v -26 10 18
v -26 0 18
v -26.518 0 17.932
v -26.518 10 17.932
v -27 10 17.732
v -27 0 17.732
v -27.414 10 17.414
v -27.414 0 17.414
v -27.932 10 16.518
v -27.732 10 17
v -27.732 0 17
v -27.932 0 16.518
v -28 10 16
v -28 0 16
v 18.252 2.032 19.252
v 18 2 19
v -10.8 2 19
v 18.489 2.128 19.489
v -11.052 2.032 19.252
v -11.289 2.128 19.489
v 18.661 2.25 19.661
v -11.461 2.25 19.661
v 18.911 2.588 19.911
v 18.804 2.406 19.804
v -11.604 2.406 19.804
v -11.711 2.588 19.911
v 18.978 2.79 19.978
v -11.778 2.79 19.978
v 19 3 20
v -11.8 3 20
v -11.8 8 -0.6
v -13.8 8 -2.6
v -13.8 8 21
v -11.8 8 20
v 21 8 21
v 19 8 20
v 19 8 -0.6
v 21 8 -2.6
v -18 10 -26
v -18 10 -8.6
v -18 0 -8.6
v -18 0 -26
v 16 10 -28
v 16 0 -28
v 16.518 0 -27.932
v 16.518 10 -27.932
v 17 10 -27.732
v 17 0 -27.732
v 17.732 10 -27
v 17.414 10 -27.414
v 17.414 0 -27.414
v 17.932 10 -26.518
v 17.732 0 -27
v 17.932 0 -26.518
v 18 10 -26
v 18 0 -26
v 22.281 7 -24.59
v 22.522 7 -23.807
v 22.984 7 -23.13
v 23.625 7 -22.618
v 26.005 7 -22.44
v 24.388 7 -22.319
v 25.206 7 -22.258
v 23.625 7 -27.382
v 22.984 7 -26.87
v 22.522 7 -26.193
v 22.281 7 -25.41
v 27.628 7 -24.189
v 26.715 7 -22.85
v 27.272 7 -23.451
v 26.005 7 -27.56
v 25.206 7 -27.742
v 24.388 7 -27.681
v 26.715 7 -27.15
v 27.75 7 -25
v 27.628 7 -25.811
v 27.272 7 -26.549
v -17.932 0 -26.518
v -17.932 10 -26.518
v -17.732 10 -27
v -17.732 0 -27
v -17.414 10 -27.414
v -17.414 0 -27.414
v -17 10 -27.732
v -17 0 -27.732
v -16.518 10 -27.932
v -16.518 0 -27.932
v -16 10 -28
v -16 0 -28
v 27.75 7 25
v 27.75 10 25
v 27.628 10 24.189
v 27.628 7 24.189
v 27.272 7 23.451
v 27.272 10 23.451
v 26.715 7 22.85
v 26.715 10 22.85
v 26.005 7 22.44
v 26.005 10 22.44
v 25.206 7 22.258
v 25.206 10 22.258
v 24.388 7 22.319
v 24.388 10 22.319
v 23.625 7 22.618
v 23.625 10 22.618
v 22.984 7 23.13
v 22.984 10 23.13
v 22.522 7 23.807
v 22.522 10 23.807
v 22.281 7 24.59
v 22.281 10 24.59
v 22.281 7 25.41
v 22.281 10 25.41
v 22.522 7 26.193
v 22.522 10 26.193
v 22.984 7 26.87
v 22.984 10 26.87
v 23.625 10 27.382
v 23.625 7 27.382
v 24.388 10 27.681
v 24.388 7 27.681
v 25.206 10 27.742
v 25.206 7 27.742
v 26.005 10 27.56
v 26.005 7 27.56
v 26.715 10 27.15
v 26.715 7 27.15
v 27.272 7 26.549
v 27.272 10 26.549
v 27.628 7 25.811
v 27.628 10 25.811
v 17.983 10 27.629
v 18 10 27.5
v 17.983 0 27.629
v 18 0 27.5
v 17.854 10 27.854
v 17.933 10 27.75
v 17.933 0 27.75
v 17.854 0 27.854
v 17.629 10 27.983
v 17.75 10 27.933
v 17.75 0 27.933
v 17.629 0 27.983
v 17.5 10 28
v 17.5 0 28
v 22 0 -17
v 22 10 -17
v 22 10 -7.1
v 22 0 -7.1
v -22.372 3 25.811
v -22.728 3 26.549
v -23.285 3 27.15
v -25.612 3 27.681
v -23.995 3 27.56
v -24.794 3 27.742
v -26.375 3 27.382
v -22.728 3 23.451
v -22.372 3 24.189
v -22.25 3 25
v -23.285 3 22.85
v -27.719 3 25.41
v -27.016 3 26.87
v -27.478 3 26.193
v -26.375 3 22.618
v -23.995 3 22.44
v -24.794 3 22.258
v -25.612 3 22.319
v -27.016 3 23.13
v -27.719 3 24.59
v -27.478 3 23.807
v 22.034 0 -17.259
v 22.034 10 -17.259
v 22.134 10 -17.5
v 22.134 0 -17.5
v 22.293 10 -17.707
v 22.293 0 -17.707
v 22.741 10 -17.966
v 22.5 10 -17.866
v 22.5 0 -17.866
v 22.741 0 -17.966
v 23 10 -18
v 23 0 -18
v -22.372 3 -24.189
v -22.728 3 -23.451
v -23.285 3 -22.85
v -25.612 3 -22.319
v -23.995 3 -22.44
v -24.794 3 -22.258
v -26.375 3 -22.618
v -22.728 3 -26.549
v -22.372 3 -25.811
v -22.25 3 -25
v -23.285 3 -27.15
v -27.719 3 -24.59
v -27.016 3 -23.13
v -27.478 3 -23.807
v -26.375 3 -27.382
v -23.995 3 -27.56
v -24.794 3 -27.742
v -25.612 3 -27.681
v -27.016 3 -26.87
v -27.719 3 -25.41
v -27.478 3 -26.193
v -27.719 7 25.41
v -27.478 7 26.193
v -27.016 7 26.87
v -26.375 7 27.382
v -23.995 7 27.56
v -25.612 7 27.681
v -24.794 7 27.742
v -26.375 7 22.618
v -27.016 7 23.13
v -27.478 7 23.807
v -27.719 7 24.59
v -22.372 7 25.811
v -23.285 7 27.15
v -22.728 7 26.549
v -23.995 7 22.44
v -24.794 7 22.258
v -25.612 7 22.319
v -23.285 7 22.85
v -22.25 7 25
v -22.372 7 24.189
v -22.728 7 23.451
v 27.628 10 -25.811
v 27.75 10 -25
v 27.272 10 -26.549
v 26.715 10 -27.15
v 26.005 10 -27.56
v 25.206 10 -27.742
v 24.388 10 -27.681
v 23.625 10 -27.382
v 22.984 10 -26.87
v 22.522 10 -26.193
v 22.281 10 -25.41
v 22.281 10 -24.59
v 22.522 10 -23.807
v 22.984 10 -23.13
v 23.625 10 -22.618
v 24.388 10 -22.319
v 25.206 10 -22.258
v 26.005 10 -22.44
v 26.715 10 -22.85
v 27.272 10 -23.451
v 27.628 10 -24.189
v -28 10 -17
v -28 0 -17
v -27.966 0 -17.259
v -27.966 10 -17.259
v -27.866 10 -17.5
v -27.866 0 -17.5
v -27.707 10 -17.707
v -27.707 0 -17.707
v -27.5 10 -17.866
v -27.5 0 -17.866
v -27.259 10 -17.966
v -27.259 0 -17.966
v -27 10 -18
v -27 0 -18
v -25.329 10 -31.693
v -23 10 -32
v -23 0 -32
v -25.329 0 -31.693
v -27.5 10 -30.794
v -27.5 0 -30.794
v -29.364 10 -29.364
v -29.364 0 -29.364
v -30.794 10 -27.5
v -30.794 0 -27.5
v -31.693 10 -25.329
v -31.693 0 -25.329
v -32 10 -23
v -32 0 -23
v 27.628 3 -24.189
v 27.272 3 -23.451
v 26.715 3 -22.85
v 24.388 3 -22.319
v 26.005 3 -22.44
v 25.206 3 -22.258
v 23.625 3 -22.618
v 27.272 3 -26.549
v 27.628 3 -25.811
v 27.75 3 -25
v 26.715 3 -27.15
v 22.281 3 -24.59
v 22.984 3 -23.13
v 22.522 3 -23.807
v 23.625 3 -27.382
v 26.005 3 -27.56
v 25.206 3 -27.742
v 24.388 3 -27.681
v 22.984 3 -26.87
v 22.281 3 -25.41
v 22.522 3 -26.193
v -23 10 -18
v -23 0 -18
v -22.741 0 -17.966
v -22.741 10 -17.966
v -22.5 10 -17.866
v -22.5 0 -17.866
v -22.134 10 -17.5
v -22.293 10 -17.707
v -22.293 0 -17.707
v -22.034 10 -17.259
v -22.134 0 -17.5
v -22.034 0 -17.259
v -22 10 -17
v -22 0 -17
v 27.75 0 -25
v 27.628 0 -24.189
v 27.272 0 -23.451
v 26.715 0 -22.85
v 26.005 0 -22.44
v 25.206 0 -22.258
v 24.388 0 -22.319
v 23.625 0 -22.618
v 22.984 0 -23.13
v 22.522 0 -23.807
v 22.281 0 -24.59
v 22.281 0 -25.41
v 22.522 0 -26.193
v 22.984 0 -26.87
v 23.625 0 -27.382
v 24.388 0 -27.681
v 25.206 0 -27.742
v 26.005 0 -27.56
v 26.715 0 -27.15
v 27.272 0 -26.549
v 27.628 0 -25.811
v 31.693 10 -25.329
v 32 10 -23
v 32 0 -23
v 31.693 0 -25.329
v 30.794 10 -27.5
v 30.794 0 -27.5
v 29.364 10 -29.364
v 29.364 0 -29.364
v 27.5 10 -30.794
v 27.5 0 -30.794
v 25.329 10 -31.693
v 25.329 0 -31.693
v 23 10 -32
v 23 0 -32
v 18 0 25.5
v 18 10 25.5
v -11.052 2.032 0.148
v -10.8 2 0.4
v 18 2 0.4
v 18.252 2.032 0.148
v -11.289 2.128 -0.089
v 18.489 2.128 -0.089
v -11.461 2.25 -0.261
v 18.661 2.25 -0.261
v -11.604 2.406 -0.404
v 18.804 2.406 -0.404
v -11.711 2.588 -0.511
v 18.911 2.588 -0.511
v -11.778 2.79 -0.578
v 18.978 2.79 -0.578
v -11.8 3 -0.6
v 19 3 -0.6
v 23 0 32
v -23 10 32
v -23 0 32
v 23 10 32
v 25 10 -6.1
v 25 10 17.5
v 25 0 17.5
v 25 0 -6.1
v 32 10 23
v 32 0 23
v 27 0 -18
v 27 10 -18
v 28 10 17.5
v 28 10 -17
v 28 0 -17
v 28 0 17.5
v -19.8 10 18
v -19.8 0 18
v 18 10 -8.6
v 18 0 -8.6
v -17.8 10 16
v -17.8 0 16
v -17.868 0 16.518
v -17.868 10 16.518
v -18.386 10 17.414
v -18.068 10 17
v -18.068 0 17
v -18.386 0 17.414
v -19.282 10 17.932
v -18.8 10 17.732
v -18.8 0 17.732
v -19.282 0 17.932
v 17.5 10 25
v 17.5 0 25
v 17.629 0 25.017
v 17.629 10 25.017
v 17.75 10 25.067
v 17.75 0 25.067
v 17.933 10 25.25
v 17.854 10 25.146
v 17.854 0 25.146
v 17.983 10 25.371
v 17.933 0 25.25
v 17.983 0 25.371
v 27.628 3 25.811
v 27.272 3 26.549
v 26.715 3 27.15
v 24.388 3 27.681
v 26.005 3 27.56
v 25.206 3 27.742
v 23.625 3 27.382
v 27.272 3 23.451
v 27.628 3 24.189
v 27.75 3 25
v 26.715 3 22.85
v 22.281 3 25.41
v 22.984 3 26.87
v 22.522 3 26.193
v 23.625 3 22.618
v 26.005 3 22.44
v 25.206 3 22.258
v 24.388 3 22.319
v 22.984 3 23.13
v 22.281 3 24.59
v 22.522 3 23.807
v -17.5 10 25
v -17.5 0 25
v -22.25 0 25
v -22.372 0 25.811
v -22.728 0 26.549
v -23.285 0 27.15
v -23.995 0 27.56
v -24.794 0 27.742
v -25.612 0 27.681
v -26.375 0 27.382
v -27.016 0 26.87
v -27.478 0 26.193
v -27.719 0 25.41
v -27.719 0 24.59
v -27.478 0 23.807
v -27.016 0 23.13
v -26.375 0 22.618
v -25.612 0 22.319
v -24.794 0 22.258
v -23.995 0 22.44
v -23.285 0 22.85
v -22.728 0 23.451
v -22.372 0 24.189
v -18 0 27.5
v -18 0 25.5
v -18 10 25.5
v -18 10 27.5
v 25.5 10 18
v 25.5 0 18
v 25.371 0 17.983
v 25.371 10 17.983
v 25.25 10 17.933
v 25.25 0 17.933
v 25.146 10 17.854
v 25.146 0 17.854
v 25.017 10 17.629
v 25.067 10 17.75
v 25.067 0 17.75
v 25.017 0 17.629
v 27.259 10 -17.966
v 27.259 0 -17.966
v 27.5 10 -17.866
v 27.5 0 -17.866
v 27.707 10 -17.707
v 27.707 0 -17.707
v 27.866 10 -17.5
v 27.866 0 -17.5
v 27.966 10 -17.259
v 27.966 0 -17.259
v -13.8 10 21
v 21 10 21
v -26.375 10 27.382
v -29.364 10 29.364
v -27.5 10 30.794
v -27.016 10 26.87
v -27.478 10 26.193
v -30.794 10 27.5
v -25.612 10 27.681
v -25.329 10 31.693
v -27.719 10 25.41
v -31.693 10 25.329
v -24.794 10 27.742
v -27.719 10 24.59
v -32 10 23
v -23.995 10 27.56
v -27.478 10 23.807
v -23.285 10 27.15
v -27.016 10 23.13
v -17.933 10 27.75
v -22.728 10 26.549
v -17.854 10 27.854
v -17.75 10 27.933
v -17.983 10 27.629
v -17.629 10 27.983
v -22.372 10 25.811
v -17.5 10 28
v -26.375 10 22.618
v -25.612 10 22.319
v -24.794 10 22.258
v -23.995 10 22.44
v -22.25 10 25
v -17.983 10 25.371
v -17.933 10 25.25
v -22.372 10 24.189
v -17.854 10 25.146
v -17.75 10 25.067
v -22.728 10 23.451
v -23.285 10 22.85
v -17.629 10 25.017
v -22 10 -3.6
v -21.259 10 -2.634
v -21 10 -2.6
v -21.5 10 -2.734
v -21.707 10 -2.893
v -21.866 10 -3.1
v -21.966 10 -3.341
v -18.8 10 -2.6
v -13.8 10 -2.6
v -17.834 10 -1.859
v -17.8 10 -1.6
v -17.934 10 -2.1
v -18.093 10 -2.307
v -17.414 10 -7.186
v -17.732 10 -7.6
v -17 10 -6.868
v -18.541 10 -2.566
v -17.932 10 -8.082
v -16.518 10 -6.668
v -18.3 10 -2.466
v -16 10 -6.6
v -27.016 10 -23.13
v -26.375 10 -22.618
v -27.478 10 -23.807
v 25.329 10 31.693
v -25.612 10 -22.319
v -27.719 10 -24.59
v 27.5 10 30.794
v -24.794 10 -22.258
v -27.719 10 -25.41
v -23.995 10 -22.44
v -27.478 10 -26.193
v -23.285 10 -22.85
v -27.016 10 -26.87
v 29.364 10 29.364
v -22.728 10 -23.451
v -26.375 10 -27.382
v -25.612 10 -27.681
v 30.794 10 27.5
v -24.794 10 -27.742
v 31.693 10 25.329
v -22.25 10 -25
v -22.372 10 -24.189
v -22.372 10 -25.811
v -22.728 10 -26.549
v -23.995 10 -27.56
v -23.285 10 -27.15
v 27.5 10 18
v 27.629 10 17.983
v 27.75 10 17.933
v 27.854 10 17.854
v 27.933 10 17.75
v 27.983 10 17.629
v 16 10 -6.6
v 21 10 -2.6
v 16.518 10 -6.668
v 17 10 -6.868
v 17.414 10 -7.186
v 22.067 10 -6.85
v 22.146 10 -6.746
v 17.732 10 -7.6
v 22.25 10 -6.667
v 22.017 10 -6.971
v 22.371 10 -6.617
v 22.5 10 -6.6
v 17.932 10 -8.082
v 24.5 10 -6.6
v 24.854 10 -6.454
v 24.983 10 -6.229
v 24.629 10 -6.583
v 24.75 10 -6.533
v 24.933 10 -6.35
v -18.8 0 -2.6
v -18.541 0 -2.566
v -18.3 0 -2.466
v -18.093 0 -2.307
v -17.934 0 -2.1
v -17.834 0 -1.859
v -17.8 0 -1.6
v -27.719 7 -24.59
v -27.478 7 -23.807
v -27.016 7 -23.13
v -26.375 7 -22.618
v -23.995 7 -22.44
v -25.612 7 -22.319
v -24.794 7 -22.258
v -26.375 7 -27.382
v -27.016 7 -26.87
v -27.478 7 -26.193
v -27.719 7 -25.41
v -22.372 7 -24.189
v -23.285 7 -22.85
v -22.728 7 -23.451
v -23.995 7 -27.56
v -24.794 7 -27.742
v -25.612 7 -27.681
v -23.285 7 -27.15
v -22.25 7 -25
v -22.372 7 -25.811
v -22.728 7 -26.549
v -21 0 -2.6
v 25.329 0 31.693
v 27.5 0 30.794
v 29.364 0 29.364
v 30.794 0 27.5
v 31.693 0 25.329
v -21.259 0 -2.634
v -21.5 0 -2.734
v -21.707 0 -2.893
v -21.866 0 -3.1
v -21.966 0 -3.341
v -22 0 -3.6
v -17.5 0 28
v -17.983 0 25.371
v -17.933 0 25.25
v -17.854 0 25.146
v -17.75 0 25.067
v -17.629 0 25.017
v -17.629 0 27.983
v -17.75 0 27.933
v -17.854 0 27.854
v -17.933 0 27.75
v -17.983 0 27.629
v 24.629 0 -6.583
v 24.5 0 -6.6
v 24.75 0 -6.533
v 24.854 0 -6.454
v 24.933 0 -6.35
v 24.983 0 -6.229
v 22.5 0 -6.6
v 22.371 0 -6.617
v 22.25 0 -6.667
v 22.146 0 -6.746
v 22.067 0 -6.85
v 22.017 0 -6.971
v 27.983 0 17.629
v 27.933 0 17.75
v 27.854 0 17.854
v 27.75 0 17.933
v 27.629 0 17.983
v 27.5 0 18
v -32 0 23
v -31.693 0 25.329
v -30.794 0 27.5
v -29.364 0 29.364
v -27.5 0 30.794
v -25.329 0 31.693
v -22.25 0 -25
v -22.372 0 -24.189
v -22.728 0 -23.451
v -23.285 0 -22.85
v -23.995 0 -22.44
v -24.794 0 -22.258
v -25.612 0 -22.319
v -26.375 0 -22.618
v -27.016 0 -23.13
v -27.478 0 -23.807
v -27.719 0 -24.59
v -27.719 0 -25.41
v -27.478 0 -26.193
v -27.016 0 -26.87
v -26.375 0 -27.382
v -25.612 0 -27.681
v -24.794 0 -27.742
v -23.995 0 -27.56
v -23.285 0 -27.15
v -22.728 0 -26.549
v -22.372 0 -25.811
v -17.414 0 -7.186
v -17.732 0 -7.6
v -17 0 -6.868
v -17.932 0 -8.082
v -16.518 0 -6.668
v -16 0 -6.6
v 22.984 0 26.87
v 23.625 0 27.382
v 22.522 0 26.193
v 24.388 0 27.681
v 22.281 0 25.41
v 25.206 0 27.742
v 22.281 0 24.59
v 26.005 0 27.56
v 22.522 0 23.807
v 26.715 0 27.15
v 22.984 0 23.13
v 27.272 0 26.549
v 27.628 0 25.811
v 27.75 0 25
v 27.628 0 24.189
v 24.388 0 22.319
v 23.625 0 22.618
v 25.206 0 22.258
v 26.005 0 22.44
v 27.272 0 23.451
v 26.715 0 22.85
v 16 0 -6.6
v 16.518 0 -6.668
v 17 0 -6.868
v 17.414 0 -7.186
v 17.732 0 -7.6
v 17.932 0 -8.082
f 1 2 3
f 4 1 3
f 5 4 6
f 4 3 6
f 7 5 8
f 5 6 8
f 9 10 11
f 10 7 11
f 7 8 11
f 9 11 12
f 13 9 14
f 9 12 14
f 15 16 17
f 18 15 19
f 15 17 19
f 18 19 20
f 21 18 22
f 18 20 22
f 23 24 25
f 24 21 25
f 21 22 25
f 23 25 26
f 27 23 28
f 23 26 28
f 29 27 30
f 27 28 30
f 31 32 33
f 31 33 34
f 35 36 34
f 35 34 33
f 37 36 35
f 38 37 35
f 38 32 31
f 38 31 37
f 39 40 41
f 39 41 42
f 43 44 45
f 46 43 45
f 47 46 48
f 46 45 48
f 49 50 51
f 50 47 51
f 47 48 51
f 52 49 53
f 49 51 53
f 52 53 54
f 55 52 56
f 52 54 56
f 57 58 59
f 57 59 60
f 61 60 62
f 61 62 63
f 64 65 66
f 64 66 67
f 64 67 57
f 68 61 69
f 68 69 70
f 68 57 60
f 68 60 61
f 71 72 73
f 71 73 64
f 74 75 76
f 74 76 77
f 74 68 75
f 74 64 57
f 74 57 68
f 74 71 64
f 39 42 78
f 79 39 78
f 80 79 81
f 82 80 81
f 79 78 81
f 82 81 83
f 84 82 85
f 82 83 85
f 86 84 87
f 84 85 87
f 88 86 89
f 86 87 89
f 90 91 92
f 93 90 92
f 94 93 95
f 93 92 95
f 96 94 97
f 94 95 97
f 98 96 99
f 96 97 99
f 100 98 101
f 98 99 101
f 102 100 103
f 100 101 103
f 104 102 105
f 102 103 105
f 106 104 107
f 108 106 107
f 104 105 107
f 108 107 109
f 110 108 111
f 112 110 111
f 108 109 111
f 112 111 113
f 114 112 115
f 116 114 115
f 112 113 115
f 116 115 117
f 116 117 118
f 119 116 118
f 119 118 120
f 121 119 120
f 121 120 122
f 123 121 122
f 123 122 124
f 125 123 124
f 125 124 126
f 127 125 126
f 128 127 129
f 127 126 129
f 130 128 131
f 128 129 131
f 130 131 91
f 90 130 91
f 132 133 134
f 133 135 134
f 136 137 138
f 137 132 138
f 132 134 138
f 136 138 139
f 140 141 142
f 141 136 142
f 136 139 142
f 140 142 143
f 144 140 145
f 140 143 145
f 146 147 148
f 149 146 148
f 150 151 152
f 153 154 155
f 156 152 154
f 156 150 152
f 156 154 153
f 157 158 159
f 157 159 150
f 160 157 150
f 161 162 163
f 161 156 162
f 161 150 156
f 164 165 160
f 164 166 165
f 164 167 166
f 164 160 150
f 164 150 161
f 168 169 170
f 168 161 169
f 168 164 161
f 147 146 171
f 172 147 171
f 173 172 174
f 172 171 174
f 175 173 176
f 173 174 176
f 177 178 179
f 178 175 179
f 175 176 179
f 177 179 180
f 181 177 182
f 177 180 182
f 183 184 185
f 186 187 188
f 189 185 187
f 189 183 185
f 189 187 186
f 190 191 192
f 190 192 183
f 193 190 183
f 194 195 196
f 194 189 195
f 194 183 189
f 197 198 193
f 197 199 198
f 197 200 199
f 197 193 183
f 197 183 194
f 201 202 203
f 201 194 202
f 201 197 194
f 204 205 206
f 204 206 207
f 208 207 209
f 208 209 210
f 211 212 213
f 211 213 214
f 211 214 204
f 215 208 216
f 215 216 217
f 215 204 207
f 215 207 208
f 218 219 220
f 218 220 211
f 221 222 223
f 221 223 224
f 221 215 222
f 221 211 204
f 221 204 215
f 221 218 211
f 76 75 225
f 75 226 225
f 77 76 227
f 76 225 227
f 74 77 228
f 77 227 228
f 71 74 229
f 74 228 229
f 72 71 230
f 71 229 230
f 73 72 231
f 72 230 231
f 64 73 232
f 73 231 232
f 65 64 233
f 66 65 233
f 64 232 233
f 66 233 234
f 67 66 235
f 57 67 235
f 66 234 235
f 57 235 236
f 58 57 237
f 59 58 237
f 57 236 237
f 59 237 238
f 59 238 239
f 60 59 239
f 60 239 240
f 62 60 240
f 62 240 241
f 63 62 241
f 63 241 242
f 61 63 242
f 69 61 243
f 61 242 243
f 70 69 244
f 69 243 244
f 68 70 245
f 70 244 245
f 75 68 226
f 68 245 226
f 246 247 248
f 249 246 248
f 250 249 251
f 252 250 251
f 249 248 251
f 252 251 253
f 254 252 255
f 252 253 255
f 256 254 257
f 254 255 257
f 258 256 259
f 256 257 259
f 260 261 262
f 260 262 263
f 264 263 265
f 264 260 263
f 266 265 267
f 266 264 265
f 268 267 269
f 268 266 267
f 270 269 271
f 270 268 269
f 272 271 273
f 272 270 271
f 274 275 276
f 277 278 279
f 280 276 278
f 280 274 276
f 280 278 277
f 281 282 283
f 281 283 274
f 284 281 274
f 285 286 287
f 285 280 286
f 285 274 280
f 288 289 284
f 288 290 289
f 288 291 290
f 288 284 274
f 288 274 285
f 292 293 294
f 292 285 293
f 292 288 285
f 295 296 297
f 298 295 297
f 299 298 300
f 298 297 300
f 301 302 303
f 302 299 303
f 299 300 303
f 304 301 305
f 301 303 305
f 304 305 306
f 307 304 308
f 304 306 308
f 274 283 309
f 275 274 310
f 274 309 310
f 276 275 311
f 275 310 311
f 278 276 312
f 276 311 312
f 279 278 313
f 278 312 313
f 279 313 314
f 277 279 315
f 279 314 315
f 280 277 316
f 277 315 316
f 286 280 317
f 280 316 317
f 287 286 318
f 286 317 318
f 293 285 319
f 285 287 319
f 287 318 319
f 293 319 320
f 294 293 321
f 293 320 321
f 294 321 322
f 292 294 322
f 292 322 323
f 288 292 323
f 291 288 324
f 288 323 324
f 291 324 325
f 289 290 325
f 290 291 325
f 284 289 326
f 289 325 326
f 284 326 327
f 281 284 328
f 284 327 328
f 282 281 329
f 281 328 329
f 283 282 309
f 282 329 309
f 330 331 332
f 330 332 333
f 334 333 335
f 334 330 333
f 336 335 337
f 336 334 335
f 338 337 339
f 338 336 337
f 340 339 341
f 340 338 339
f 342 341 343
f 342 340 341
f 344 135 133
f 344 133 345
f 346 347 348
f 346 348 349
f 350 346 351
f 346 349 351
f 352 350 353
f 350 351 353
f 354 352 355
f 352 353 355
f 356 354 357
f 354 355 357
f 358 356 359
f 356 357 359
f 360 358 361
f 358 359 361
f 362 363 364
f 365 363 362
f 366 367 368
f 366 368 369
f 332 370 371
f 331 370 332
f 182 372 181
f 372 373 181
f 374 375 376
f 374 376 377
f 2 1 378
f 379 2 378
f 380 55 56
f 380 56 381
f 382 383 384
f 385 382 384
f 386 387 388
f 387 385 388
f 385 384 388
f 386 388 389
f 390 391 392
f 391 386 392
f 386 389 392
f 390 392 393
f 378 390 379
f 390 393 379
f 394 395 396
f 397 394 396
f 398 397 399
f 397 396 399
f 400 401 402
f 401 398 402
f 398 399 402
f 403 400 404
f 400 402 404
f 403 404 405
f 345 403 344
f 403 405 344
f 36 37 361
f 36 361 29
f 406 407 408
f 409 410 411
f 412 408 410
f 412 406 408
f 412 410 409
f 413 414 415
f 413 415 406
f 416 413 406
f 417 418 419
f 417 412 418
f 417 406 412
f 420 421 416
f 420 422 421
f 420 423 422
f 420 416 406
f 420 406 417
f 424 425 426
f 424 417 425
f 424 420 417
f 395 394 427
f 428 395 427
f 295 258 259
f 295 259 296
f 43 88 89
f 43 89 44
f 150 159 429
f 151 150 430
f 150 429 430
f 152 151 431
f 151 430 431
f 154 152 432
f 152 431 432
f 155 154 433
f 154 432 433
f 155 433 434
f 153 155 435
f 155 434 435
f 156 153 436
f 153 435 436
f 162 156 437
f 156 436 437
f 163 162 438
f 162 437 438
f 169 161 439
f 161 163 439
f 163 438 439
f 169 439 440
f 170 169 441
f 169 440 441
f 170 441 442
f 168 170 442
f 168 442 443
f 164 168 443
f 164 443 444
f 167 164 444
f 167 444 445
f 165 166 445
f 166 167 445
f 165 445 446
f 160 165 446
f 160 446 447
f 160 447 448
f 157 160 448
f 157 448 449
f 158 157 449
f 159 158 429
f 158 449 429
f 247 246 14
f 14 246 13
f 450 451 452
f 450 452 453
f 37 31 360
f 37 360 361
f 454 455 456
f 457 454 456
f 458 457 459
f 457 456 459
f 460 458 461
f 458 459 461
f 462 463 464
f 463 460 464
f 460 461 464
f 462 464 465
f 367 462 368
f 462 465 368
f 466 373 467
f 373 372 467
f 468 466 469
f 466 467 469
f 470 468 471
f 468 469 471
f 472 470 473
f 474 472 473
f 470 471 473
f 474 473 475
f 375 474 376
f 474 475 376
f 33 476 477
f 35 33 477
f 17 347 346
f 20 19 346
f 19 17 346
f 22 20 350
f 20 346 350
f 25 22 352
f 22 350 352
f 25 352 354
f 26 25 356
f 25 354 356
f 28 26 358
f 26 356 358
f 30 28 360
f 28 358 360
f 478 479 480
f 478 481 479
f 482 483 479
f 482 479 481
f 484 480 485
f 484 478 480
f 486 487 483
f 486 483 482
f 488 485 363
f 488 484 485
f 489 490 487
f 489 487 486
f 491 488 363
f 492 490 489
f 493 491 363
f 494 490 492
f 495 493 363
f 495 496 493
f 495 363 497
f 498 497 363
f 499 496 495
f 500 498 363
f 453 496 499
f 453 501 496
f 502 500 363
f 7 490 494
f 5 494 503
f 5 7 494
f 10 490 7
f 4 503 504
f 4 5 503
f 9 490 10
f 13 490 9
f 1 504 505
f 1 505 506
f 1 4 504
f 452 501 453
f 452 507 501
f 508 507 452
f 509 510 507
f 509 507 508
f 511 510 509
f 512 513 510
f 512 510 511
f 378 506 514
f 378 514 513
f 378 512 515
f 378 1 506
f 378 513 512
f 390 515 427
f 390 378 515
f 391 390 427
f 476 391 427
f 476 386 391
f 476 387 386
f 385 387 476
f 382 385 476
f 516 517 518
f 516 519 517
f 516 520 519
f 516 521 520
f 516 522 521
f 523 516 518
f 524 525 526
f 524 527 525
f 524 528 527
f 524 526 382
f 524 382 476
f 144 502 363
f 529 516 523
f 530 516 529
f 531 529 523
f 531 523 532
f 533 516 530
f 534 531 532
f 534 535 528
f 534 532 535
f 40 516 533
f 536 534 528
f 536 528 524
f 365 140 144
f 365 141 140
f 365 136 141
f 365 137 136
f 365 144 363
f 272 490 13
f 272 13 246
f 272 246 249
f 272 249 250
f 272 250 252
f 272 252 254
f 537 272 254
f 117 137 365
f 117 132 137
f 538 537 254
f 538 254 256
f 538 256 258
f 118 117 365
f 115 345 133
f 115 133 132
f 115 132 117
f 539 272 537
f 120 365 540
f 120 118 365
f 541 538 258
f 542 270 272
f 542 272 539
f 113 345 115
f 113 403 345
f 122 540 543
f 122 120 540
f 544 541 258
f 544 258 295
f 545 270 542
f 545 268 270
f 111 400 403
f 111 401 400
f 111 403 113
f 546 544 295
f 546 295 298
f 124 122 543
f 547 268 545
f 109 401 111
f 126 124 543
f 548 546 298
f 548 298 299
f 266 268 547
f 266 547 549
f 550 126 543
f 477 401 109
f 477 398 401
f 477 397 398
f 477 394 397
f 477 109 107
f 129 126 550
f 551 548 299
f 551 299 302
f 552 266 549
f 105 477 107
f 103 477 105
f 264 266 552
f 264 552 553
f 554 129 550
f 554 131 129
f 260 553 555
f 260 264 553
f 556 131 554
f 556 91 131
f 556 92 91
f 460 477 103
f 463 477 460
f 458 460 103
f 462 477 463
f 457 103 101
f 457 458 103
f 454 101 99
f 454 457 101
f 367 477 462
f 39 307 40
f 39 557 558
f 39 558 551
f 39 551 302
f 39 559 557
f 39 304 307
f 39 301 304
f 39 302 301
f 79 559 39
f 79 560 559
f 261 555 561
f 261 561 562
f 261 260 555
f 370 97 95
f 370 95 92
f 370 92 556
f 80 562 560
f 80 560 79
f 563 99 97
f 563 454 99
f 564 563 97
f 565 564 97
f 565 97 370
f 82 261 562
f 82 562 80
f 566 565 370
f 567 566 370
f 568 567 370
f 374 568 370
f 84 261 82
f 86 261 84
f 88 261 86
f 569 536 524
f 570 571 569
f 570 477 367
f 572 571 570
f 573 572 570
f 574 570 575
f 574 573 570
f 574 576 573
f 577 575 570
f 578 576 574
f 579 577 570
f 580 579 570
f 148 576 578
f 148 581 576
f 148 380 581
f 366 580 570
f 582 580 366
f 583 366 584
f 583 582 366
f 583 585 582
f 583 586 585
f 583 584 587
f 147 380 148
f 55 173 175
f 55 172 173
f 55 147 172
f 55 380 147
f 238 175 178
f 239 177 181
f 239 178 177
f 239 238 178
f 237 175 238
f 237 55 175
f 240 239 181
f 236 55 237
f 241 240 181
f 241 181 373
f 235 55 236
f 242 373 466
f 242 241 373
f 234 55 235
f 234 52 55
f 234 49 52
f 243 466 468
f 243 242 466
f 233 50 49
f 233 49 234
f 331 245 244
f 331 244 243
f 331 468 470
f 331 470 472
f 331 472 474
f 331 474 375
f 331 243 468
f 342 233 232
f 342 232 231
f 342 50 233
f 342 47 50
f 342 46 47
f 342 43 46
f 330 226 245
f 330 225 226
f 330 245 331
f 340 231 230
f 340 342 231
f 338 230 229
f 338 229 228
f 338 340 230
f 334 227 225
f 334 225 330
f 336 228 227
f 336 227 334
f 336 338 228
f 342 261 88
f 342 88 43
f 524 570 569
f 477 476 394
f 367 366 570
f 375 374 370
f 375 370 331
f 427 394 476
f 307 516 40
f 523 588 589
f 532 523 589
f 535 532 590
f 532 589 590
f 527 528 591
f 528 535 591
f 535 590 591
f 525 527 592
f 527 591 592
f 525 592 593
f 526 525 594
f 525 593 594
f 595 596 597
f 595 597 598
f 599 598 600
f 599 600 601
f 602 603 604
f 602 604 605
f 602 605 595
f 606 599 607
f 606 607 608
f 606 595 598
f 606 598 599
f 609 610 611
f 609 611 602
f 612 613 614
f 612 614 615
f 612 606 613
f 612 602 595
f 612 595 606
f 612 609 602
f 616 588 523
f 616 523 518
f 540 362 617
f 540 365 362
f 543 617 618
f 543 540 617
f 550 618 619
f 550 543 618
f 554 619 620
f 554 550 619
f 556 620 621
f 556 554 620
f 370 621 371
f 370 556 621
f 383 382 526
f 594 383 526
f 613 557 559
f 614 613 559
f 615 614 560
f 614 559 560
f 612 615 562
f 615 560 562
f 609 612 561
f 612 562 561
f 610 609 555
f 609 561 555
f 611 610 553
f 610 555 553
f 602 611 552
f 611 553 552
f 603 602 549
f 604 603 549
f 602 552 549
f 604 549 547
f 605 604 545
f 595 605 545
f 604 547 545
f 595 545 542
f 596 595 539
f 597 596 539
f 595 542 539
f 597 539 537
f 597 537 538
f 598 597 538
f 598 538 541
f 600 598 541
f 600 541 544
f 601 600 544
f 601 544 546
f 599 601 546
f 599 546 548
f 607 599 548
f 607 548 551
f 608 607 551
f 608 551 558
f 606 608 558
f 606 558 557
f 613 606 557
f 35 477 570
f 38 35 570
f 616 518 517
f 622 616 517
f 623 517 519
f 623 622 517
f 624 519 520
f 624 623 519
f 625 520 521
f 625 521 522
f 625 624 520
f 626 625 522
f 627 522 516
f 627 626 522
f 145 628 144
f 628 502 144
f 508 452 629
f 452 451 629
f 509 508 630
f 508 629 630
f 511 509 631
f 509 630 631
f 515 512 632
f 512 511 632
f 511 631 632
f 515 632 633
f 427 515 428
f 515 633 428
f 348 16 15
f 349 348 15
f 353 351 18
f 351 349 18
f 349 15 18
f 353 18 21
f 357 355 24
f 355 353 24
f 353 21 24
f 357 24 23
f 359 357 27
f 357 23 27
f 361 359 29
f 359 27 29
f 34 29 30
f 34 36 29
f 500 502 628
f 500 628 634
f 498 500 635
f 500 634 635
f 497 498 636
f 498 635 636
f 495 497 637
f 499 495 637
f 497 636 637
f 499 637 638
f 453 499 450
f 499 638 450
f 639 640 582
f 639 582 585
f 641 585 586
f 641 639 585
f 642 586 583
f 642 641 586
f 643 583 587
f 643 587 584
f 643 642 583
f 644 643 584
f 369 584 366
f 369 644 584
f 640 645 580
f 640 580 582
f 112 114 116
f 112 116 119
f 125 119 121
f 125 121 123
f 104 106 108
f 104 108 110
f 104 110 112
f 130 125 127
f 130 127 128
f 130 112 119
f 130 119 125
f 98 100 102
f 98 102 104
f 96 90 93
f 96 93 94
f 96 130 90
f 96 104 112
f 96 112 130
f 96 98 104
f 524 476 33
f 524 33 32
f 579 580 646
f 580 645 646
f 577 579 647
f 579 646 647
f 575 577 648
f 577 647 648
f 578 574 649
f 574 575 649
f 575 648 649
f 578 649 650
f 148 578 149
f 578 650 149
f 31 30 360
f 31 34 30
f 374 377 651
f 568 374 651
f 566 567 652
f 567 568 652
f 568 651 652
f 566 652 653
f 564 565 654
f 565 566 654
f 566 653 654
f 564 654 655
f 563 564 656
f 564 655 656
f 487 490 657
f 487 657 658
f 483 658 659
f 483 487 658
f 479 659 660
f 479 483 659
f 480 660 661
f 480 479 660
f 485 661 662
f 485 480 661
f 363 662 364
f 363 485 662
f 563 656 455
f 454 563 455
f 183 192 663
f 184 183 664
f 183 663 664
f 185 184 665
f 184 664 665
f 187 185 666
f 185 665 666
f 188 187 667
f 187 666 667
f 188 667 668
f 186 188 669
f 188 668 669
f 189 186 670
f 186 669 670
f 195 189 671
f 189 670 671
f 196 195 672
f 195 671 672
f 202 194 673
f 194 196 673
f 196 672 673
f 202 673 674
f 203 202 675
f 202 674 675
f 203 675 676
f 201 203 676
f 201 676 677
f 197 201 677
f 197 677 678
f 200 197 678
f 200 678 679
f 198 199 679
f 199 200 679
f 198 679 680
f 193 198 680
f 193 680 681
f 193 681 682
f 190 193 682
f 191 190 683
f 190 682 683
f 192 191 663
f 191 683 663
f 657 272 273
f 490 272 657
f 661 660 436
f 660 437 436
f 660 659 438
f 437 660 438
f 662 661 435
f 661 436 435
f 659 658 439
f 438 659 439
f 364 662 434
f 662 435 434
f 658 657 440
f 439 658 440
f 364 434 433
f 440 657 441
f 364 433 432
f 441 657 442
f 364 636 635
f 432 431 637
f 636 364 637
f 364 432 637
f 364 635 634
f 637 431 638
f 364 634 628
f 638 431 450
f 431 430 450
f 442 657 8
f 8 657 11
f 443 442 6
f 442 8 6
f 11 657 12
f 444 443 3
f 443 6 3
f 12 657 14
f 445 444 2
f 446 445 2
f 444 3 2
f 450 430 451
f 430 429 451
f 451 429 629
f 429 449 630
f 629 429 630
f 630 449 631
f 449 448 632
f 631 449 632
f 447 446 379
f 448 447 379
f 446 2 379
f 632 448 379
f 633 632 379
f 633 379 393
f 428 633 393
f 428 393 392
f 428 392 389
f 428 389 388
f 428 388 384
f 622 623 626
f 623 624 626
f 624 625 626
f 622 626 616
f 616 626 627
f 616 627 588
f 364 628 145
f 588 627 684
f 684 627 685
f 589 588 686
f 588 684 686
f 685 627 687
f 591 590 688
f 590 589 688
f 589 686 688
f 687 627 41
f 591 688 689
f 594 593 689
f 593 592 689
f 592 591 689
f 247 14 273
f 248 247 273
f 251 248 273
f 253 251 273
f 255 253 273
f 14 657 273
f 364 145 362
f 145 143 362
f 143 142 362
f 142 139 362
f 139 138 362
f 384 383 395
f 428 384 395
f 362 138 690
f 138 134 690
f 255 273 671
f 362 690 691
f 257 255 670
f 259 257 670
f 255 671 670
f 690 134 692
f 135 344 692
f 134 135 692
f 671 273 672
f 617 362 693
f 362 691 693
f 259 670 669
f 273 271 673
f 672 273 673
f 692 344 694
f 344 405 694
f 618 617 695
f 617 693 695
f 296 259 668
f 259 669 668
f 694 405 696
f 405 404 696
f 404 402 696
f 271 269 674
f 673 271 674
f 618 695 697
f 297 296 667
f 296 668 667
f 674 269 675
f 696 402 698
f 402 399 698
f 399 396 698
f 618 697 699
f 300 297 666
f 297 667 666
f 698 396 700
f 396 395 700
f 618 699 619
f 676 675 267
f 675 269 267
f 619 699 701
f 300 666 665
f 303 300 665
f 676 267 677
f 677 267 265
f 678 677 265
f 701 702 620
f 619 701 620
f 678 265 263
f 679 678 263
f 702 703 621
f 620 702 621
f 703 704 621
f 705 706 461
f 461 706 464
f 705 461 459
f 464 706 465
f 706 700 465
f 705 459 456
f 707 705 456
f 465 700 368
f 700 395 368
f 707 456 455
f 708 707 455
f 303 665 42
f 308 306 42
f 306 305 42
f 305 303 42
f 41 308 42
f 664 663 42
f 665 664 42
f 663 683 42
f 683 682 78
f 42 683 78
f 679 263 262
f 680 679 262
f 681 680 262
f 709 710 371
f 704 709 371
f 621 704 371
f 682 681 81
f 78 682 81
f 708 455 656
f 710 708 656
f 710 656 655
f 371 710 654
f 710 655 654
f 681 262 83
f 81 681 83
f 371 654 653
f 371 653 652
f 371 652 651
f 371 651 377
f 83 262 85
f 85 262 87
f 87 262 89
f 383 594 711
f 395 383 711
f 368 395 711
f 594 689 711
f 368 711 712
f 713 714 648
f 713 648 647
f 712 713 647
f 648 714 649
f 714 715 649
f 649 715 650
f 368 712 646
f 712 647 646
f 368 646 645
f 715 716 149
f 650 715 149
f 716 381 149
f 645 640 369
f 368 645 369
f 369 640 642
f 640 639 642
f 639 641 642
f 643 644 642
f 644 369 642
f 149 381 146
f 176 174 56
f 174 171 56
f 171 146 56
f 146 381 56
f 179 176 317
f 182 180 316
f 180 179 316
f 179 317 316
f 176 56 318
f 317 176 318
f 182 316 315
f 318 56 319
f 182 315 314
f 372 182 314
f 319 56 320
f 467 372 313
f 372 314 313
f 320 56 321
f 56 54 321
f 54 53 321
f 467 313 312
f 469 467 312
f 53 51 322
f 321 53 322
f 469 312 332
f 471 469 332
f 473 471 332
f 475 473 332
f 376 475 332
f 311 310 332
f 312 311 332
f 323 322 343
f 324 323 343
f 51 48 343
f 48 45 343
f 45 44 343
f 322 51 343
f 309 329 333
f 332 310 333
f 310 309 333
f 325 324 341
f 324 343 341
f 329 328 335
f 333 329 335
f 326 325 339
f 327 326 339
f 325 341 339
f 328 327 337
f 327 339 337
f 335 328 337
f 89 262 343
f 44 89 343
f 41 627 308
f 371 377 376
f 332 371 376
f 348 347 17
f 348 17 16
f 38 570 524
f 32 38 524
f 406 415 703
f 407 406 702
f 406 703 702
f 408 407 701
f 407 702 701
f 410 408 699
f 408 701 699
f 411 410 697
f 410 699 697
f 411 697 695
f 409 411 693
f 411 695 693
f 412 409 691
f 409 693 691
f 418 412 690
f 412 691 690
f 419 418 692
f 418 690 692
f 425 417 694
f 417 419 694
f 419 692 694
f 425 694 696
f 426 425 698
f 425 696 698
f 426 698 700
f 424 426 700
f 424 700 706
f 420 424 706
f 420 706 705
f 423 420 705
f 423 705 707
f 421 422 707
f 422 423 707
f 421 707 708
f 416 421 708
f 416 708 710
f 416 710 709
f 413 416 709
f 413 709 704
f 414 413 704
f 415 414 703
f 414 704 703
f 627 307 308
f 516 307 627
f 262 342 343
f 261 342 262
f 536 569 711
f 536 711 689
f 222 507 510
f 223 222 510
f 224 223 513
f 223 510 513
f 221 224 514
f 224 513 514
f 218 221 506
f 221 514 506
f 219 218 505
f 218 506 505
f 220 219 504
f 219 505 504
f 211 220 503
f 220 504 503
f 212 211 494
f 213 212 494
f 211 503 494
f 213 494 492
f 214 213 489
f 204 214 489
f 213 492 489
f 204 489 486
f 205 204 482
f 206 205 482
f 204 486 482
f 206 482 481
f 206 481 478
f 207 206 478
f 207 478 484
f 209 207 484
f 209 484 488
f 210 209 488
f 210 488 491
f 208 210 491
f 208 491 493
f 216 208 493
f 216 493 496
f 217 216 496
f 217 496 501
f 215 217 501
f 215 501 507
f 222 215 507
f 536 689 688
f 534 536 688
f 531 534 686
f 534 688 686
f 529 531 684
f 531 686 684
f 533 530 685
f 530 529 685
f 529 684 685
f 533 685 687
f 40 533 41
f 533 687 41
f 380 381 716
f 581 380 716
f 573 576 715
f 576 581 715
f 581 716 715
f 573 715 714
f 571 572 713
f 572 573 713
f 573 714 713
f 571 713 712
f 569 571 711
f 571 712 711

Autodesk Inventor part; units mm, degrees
ref_plane "YZ Plane" through (0, 0, 0) normal (1, 0, 0) x (0, 1, 0)
ref_plane "XZ Plane" through (0, 0, 0) normal (0, 1, 0) x (-1, 0, 0)
sketch "Sketch1" plane through (0, 0, 0) normal (0, 1, 0) x (-1, 0, 0)
  line L0 (30, 30) -> (-30, 30)
  line L1 (-30, 30) -> (-30, -30)
  line L2 (-30, -30) -> (30, -30)
  line L3 (30, -30) -> (30, 30)
  line L4 (30, 30) -> (-30, -30) construction
  line L5 (-30, 30) -> (30, -30) construction
  point P0 (0, 0)
  dimension "d0" = 60
  dimension "d1" = 60
extrude "Extrusion1" add sketch "Sketch1" along normal blind 10
fillet "Fillet1" radius 7 4 edges at (30, 5, 30) (30, 5, -30) (-30, 5, 30) (-30, 5, -30)
sketch "Sketch2" plane through (0, 10, 0) normal (0, 1, 0) x (1, 0, 0)
  line L0 (-30, 30) -> (30, 30)
  line L1 (30, 30) -> (30, -30)
  line L2 (30, -30) -> (-30, -30)
  line L3 (-30, -30) -> (-30, 30)
  line L4 (-30, 30) -> (30, -30) construction
  line L5 (30, 30) -> (-30, -30) construction
  line L6 (25, -25) -> (25, 25)
  line L7 (25, 25) -> (-25, 25)
  line L8 (-25, 25) -> (-25, -25)
  line L9 (-25, -25) -> (25, -25)
  circle A0 centre (25, -25) radius 2.75
  circle A1 centre (-25, -25) radius 2.75
  circle A2 centre (25, 25) radius 2.75
  circle A3 centre (-25, 25) radius 2.75
  point P0 (0, 0)
  dimension "d5" = 5
  dimension "d6" = 5.5
  dimension "d7" = 5.5
  dimension "d8" = 5.5
  dimension "d9" = 5.5
extrude "Extrusion2" cut sketch "Sketch2" against normal blind 3 contours L9 A0 L6 | L6 A0 L9 | A2 L7 L6 | L6 L7 A2 | A1 L8 L9 | L9 L8 A1 | A3 L8 L7 | L7 L8 A3
sketch "Sketch7" plane through (0, 10, 0) normal (0, 1, 0) x (1, 0, 0)
  line L0 (-23, 30) -> (23, 30)
  line L1 (30, 23) -> (30, -23)
  line L2 (23, -30) -> (-23, -30)
  line L3 (-30, -23) -> (-30, 23)
  line L4 (-30, 30) -> (30, -30) construction
  line L5 (30, 30) -> (-30, -30) construction
  arc A0 (-23, 30) -> (-30, 23) centre (-23, 23) ccw
  arc A1 (-30, -23) -> (-23, -30) centre (-23, -23) ccw
  arc A2 (23, -30) -> (30, -23) centre (23, -23) ccw
  arc A3 (30, 23) -> (23, 30) centre (23, 23) ccw
  line L6 (23, 32) -> (-23, 32)
  arc A4 (-23, 32) -> (-32, 23) centre (-23, 23) ccw
  line L7 (-32, 23) -> (-32, -23)
  arc A5 (-32, -23) -> (-23, -32) centre (-23, -23) ccw
  line L8 (-23, -32) -> (23, -32)
  arc A6 (23, -32) -> (32, -23) centre (23, -23) ccw
  line L9 (32, -23) -> (32, 23)
  arc A7 (32, 23) -> (23, 32) centre (23, 23) ccw
  point P0 (0, 0)
  dimension "d47" = 7
  dimension "d48" = 2
extrude "Extrusion6" add sketch "Sketch7" against normal blind 10
sketch "Sketch27" plane through (0, 10, 0) normal (0, 1, 0) x (1, 0, 0)
  line L0 (-25, 25) -> (25, 25)
  line L1 (25, 25) -> (25, -25)
  line L2 (25, -25) -> (-25, -25)
  line L3 (-25, -25) -> (-25, 25)
  line L4 (-25, 25) -> (25, -25) construction
  line L5 (25, 25) -> (-25, -25) construction
  line L6 (21, -21) -> (21, 21)
  line L7 (21, 21) -> (-21, 21)
  line L8 (-21, 21) -> (-21, -21)
  line L9 (-21, -21) -> (21, -21)
  line L10 (-13.8, -21) -> (-13.8, 2.6)
  line L11 (21, 2.6) -> (-13.8, 2.6)
  line L12 (19, 0.6) -> (-11.8, 0.6)
  line L13 (-11.8, 0.6) -> (-11.8, -20)
  line L14 (-19, -19) -> (-19, 19)
  line L15 (-19, 19) -> (19, 19)
  line L16 (20, 20) -> (20, 0.6)
  line L17 (-20, -20) -> (-20, 20)
  line L18 (-20, 20) -> (20, 20)
  line L19 (-13.8, -19) -> (-19, -19)
  line L20 (19, -20) -> (-11.8, -20)
  line L21 (-13.8, -20) -> (-20, -20)
  line L22 (19, 19) -> (19, 2.6)
  line L23 (19, 0.6) -> (19, -20)
  point P0 (0, 0)
  dimension "d266" = 50
  dimension "d267" = 50
  dimension "d268" = 4
  dimension "d269" = 34.8
  dimension "d270" = 23.6
  dimension "d271" = 2
  dimension "d273" = 1
extrude "Extrusion25" cut sketch "Sketch27" against normal blind 2 contours L9 L10 L11 L6
sketch "Sketch28" plane through (0, 10, 0) normal (0, 1, 0) x (1, 0, 0)
  line L0 (-11.8, 0.6) -> (19, 0.6)
  line L1 (19, 0.6) -> (19, -20)
  line L2 (19, -20) -> (-11.8, -20)
  line L3 (-11.8, -20) -> (-11.8, 0.6)
  point P0 (0, 0)
extrude "Extrusion26" cut sketch "Sketch28" against normal blind 8
sketch "Sketch29" plane through (0, 10, 0) normal (0, 1, 0) x (1, 0, 0)
  line L0 (23, 32) -> (-23, 32) projected
  line L1 (-32, 23) -> (-32, -23) projected
  line L2 (32, -23) -> (32, 23) projected
  line L3 (-13.8, 2.6) -> (21, 2.6) projected
  line L4 (-18, 28) -> (18, 28)
  line L5 (18, 28) -> (18, 6.6)
  line L6 (18, 6.6) -> (-18, 6.6)
  line L7 (-18, 6.6) -> (-18, 28)
  line L8 (-23, -32) -> (23, -32) projected
  line L9 (21, 2.6) -> (21, -21) projected
  line L10 (28, 18) -> (22, 18)
  line L11 (22, 18) -> (22, 6.6)
  line L12 (22, 6.6) -> (25, 6.6)
  line L13 (28, 18) -> (28, -18)
  line L14 (28, -18) -> (25, -18)
  line L15 (25, -18) -> (25, 2.6)
  line L16 (25, 2.6) -> (25, 6.6)
  line L17 (21, -21) -> (-13.8, -21) projected
  line L18 (18, -28) -> (18, -25)
  line L19 (18, -25) -> (-18, -25)
  line L20 (-18, -25) -> (-18, -28)
  line L21 (-18, -28) -> (18, -28)
  line L22 (-13.8, -21) -> (-13.8, 2.6) projected
  line L23 (-28, -18) -> (-17.8, -18)
  line L24 (-17.8, -18) -> (-17.8, 2.6)
  line L25 (-17.8, 2.6) -> (-22, 2.6)
  line L26 (-22, 2.6) -> (-22, 6.6)
  line L27 (-28, 18) -> (-22, 18)
  line L28 (-22, 18) -> (-22, 6.6)
  line L29 (-28, 18) -> (-28, -18)
  point P0 (0, 0)
  dimension "d278" = 4
  dimension "d279" = 4
  dimension "d280" = 14
  dimension "d281" = 14
  dimension "d282" = 4
  dimension "d283" = 4
  dimension "d284" = 4
  dimension "d285" = 14
  dimension "d286" = 14
  dimension "d287" = 4
  dimension "d288" = 4
  dimension "d289" = 4
  dimension "d290" = 4
  dimension "d291" = 14
  dimension "d292" = 14
  dimension "d293" = 4
  dimension "d294" = 14
  dimension "d295" = 14
  dimension "d296" = 4
  dimension "d297" = 4
  dimension "d298" = 4
  dimension "d299" = 4
  dimension "d300" = 14
  dimension "d301" = 4
extrude "Extrusion27" cut sketch "Sketch29" against normal through all contours L4 L5 L6 L7 | L13 L14 L15 L16 L12 L11 L10 | L21 L20 L19 L18 | L29 L27 L28 L26 L25 L24 L23
ref_plane "Work Plane7" through (0, 5, 0) normal (0, 1, 0) x (1, 0, 0)
mirror "Mirror7" about plane through (0, 5, 0) normal (0, 1, 0) of "Extrusion2"
fillet "Fillet8" radius 2 6 edges at (18, 5, -28) (-18, 5, -28) (-18, 5, -6.6) (18, 5, -6.6) (-17.8, 5, 18) (-28, 5, 18)
fillet "Fillet8" radius 1 10 edges at (-28, 5, -18) (-22, 5, -18) (-22, 5, -2.6) (-17.8, 5, -2.6) (3.6, 2, -0.6) (19, 2, 9.7) (-11.8, 2, 9.7) (3.6, 2, 20) (28, 5, -18) (22, 5, -18)
fillet "Fillet8" radius 0.5 8 edges at (-18, 5, 28) (25, 5, 18) (25, 5, -6.6) (22, 5, -6.6) (28, 5, 18) (18, 5, 28) (18, 5, 25) (-18, 5, 25)
properties part number "14 pin shortest holder"
